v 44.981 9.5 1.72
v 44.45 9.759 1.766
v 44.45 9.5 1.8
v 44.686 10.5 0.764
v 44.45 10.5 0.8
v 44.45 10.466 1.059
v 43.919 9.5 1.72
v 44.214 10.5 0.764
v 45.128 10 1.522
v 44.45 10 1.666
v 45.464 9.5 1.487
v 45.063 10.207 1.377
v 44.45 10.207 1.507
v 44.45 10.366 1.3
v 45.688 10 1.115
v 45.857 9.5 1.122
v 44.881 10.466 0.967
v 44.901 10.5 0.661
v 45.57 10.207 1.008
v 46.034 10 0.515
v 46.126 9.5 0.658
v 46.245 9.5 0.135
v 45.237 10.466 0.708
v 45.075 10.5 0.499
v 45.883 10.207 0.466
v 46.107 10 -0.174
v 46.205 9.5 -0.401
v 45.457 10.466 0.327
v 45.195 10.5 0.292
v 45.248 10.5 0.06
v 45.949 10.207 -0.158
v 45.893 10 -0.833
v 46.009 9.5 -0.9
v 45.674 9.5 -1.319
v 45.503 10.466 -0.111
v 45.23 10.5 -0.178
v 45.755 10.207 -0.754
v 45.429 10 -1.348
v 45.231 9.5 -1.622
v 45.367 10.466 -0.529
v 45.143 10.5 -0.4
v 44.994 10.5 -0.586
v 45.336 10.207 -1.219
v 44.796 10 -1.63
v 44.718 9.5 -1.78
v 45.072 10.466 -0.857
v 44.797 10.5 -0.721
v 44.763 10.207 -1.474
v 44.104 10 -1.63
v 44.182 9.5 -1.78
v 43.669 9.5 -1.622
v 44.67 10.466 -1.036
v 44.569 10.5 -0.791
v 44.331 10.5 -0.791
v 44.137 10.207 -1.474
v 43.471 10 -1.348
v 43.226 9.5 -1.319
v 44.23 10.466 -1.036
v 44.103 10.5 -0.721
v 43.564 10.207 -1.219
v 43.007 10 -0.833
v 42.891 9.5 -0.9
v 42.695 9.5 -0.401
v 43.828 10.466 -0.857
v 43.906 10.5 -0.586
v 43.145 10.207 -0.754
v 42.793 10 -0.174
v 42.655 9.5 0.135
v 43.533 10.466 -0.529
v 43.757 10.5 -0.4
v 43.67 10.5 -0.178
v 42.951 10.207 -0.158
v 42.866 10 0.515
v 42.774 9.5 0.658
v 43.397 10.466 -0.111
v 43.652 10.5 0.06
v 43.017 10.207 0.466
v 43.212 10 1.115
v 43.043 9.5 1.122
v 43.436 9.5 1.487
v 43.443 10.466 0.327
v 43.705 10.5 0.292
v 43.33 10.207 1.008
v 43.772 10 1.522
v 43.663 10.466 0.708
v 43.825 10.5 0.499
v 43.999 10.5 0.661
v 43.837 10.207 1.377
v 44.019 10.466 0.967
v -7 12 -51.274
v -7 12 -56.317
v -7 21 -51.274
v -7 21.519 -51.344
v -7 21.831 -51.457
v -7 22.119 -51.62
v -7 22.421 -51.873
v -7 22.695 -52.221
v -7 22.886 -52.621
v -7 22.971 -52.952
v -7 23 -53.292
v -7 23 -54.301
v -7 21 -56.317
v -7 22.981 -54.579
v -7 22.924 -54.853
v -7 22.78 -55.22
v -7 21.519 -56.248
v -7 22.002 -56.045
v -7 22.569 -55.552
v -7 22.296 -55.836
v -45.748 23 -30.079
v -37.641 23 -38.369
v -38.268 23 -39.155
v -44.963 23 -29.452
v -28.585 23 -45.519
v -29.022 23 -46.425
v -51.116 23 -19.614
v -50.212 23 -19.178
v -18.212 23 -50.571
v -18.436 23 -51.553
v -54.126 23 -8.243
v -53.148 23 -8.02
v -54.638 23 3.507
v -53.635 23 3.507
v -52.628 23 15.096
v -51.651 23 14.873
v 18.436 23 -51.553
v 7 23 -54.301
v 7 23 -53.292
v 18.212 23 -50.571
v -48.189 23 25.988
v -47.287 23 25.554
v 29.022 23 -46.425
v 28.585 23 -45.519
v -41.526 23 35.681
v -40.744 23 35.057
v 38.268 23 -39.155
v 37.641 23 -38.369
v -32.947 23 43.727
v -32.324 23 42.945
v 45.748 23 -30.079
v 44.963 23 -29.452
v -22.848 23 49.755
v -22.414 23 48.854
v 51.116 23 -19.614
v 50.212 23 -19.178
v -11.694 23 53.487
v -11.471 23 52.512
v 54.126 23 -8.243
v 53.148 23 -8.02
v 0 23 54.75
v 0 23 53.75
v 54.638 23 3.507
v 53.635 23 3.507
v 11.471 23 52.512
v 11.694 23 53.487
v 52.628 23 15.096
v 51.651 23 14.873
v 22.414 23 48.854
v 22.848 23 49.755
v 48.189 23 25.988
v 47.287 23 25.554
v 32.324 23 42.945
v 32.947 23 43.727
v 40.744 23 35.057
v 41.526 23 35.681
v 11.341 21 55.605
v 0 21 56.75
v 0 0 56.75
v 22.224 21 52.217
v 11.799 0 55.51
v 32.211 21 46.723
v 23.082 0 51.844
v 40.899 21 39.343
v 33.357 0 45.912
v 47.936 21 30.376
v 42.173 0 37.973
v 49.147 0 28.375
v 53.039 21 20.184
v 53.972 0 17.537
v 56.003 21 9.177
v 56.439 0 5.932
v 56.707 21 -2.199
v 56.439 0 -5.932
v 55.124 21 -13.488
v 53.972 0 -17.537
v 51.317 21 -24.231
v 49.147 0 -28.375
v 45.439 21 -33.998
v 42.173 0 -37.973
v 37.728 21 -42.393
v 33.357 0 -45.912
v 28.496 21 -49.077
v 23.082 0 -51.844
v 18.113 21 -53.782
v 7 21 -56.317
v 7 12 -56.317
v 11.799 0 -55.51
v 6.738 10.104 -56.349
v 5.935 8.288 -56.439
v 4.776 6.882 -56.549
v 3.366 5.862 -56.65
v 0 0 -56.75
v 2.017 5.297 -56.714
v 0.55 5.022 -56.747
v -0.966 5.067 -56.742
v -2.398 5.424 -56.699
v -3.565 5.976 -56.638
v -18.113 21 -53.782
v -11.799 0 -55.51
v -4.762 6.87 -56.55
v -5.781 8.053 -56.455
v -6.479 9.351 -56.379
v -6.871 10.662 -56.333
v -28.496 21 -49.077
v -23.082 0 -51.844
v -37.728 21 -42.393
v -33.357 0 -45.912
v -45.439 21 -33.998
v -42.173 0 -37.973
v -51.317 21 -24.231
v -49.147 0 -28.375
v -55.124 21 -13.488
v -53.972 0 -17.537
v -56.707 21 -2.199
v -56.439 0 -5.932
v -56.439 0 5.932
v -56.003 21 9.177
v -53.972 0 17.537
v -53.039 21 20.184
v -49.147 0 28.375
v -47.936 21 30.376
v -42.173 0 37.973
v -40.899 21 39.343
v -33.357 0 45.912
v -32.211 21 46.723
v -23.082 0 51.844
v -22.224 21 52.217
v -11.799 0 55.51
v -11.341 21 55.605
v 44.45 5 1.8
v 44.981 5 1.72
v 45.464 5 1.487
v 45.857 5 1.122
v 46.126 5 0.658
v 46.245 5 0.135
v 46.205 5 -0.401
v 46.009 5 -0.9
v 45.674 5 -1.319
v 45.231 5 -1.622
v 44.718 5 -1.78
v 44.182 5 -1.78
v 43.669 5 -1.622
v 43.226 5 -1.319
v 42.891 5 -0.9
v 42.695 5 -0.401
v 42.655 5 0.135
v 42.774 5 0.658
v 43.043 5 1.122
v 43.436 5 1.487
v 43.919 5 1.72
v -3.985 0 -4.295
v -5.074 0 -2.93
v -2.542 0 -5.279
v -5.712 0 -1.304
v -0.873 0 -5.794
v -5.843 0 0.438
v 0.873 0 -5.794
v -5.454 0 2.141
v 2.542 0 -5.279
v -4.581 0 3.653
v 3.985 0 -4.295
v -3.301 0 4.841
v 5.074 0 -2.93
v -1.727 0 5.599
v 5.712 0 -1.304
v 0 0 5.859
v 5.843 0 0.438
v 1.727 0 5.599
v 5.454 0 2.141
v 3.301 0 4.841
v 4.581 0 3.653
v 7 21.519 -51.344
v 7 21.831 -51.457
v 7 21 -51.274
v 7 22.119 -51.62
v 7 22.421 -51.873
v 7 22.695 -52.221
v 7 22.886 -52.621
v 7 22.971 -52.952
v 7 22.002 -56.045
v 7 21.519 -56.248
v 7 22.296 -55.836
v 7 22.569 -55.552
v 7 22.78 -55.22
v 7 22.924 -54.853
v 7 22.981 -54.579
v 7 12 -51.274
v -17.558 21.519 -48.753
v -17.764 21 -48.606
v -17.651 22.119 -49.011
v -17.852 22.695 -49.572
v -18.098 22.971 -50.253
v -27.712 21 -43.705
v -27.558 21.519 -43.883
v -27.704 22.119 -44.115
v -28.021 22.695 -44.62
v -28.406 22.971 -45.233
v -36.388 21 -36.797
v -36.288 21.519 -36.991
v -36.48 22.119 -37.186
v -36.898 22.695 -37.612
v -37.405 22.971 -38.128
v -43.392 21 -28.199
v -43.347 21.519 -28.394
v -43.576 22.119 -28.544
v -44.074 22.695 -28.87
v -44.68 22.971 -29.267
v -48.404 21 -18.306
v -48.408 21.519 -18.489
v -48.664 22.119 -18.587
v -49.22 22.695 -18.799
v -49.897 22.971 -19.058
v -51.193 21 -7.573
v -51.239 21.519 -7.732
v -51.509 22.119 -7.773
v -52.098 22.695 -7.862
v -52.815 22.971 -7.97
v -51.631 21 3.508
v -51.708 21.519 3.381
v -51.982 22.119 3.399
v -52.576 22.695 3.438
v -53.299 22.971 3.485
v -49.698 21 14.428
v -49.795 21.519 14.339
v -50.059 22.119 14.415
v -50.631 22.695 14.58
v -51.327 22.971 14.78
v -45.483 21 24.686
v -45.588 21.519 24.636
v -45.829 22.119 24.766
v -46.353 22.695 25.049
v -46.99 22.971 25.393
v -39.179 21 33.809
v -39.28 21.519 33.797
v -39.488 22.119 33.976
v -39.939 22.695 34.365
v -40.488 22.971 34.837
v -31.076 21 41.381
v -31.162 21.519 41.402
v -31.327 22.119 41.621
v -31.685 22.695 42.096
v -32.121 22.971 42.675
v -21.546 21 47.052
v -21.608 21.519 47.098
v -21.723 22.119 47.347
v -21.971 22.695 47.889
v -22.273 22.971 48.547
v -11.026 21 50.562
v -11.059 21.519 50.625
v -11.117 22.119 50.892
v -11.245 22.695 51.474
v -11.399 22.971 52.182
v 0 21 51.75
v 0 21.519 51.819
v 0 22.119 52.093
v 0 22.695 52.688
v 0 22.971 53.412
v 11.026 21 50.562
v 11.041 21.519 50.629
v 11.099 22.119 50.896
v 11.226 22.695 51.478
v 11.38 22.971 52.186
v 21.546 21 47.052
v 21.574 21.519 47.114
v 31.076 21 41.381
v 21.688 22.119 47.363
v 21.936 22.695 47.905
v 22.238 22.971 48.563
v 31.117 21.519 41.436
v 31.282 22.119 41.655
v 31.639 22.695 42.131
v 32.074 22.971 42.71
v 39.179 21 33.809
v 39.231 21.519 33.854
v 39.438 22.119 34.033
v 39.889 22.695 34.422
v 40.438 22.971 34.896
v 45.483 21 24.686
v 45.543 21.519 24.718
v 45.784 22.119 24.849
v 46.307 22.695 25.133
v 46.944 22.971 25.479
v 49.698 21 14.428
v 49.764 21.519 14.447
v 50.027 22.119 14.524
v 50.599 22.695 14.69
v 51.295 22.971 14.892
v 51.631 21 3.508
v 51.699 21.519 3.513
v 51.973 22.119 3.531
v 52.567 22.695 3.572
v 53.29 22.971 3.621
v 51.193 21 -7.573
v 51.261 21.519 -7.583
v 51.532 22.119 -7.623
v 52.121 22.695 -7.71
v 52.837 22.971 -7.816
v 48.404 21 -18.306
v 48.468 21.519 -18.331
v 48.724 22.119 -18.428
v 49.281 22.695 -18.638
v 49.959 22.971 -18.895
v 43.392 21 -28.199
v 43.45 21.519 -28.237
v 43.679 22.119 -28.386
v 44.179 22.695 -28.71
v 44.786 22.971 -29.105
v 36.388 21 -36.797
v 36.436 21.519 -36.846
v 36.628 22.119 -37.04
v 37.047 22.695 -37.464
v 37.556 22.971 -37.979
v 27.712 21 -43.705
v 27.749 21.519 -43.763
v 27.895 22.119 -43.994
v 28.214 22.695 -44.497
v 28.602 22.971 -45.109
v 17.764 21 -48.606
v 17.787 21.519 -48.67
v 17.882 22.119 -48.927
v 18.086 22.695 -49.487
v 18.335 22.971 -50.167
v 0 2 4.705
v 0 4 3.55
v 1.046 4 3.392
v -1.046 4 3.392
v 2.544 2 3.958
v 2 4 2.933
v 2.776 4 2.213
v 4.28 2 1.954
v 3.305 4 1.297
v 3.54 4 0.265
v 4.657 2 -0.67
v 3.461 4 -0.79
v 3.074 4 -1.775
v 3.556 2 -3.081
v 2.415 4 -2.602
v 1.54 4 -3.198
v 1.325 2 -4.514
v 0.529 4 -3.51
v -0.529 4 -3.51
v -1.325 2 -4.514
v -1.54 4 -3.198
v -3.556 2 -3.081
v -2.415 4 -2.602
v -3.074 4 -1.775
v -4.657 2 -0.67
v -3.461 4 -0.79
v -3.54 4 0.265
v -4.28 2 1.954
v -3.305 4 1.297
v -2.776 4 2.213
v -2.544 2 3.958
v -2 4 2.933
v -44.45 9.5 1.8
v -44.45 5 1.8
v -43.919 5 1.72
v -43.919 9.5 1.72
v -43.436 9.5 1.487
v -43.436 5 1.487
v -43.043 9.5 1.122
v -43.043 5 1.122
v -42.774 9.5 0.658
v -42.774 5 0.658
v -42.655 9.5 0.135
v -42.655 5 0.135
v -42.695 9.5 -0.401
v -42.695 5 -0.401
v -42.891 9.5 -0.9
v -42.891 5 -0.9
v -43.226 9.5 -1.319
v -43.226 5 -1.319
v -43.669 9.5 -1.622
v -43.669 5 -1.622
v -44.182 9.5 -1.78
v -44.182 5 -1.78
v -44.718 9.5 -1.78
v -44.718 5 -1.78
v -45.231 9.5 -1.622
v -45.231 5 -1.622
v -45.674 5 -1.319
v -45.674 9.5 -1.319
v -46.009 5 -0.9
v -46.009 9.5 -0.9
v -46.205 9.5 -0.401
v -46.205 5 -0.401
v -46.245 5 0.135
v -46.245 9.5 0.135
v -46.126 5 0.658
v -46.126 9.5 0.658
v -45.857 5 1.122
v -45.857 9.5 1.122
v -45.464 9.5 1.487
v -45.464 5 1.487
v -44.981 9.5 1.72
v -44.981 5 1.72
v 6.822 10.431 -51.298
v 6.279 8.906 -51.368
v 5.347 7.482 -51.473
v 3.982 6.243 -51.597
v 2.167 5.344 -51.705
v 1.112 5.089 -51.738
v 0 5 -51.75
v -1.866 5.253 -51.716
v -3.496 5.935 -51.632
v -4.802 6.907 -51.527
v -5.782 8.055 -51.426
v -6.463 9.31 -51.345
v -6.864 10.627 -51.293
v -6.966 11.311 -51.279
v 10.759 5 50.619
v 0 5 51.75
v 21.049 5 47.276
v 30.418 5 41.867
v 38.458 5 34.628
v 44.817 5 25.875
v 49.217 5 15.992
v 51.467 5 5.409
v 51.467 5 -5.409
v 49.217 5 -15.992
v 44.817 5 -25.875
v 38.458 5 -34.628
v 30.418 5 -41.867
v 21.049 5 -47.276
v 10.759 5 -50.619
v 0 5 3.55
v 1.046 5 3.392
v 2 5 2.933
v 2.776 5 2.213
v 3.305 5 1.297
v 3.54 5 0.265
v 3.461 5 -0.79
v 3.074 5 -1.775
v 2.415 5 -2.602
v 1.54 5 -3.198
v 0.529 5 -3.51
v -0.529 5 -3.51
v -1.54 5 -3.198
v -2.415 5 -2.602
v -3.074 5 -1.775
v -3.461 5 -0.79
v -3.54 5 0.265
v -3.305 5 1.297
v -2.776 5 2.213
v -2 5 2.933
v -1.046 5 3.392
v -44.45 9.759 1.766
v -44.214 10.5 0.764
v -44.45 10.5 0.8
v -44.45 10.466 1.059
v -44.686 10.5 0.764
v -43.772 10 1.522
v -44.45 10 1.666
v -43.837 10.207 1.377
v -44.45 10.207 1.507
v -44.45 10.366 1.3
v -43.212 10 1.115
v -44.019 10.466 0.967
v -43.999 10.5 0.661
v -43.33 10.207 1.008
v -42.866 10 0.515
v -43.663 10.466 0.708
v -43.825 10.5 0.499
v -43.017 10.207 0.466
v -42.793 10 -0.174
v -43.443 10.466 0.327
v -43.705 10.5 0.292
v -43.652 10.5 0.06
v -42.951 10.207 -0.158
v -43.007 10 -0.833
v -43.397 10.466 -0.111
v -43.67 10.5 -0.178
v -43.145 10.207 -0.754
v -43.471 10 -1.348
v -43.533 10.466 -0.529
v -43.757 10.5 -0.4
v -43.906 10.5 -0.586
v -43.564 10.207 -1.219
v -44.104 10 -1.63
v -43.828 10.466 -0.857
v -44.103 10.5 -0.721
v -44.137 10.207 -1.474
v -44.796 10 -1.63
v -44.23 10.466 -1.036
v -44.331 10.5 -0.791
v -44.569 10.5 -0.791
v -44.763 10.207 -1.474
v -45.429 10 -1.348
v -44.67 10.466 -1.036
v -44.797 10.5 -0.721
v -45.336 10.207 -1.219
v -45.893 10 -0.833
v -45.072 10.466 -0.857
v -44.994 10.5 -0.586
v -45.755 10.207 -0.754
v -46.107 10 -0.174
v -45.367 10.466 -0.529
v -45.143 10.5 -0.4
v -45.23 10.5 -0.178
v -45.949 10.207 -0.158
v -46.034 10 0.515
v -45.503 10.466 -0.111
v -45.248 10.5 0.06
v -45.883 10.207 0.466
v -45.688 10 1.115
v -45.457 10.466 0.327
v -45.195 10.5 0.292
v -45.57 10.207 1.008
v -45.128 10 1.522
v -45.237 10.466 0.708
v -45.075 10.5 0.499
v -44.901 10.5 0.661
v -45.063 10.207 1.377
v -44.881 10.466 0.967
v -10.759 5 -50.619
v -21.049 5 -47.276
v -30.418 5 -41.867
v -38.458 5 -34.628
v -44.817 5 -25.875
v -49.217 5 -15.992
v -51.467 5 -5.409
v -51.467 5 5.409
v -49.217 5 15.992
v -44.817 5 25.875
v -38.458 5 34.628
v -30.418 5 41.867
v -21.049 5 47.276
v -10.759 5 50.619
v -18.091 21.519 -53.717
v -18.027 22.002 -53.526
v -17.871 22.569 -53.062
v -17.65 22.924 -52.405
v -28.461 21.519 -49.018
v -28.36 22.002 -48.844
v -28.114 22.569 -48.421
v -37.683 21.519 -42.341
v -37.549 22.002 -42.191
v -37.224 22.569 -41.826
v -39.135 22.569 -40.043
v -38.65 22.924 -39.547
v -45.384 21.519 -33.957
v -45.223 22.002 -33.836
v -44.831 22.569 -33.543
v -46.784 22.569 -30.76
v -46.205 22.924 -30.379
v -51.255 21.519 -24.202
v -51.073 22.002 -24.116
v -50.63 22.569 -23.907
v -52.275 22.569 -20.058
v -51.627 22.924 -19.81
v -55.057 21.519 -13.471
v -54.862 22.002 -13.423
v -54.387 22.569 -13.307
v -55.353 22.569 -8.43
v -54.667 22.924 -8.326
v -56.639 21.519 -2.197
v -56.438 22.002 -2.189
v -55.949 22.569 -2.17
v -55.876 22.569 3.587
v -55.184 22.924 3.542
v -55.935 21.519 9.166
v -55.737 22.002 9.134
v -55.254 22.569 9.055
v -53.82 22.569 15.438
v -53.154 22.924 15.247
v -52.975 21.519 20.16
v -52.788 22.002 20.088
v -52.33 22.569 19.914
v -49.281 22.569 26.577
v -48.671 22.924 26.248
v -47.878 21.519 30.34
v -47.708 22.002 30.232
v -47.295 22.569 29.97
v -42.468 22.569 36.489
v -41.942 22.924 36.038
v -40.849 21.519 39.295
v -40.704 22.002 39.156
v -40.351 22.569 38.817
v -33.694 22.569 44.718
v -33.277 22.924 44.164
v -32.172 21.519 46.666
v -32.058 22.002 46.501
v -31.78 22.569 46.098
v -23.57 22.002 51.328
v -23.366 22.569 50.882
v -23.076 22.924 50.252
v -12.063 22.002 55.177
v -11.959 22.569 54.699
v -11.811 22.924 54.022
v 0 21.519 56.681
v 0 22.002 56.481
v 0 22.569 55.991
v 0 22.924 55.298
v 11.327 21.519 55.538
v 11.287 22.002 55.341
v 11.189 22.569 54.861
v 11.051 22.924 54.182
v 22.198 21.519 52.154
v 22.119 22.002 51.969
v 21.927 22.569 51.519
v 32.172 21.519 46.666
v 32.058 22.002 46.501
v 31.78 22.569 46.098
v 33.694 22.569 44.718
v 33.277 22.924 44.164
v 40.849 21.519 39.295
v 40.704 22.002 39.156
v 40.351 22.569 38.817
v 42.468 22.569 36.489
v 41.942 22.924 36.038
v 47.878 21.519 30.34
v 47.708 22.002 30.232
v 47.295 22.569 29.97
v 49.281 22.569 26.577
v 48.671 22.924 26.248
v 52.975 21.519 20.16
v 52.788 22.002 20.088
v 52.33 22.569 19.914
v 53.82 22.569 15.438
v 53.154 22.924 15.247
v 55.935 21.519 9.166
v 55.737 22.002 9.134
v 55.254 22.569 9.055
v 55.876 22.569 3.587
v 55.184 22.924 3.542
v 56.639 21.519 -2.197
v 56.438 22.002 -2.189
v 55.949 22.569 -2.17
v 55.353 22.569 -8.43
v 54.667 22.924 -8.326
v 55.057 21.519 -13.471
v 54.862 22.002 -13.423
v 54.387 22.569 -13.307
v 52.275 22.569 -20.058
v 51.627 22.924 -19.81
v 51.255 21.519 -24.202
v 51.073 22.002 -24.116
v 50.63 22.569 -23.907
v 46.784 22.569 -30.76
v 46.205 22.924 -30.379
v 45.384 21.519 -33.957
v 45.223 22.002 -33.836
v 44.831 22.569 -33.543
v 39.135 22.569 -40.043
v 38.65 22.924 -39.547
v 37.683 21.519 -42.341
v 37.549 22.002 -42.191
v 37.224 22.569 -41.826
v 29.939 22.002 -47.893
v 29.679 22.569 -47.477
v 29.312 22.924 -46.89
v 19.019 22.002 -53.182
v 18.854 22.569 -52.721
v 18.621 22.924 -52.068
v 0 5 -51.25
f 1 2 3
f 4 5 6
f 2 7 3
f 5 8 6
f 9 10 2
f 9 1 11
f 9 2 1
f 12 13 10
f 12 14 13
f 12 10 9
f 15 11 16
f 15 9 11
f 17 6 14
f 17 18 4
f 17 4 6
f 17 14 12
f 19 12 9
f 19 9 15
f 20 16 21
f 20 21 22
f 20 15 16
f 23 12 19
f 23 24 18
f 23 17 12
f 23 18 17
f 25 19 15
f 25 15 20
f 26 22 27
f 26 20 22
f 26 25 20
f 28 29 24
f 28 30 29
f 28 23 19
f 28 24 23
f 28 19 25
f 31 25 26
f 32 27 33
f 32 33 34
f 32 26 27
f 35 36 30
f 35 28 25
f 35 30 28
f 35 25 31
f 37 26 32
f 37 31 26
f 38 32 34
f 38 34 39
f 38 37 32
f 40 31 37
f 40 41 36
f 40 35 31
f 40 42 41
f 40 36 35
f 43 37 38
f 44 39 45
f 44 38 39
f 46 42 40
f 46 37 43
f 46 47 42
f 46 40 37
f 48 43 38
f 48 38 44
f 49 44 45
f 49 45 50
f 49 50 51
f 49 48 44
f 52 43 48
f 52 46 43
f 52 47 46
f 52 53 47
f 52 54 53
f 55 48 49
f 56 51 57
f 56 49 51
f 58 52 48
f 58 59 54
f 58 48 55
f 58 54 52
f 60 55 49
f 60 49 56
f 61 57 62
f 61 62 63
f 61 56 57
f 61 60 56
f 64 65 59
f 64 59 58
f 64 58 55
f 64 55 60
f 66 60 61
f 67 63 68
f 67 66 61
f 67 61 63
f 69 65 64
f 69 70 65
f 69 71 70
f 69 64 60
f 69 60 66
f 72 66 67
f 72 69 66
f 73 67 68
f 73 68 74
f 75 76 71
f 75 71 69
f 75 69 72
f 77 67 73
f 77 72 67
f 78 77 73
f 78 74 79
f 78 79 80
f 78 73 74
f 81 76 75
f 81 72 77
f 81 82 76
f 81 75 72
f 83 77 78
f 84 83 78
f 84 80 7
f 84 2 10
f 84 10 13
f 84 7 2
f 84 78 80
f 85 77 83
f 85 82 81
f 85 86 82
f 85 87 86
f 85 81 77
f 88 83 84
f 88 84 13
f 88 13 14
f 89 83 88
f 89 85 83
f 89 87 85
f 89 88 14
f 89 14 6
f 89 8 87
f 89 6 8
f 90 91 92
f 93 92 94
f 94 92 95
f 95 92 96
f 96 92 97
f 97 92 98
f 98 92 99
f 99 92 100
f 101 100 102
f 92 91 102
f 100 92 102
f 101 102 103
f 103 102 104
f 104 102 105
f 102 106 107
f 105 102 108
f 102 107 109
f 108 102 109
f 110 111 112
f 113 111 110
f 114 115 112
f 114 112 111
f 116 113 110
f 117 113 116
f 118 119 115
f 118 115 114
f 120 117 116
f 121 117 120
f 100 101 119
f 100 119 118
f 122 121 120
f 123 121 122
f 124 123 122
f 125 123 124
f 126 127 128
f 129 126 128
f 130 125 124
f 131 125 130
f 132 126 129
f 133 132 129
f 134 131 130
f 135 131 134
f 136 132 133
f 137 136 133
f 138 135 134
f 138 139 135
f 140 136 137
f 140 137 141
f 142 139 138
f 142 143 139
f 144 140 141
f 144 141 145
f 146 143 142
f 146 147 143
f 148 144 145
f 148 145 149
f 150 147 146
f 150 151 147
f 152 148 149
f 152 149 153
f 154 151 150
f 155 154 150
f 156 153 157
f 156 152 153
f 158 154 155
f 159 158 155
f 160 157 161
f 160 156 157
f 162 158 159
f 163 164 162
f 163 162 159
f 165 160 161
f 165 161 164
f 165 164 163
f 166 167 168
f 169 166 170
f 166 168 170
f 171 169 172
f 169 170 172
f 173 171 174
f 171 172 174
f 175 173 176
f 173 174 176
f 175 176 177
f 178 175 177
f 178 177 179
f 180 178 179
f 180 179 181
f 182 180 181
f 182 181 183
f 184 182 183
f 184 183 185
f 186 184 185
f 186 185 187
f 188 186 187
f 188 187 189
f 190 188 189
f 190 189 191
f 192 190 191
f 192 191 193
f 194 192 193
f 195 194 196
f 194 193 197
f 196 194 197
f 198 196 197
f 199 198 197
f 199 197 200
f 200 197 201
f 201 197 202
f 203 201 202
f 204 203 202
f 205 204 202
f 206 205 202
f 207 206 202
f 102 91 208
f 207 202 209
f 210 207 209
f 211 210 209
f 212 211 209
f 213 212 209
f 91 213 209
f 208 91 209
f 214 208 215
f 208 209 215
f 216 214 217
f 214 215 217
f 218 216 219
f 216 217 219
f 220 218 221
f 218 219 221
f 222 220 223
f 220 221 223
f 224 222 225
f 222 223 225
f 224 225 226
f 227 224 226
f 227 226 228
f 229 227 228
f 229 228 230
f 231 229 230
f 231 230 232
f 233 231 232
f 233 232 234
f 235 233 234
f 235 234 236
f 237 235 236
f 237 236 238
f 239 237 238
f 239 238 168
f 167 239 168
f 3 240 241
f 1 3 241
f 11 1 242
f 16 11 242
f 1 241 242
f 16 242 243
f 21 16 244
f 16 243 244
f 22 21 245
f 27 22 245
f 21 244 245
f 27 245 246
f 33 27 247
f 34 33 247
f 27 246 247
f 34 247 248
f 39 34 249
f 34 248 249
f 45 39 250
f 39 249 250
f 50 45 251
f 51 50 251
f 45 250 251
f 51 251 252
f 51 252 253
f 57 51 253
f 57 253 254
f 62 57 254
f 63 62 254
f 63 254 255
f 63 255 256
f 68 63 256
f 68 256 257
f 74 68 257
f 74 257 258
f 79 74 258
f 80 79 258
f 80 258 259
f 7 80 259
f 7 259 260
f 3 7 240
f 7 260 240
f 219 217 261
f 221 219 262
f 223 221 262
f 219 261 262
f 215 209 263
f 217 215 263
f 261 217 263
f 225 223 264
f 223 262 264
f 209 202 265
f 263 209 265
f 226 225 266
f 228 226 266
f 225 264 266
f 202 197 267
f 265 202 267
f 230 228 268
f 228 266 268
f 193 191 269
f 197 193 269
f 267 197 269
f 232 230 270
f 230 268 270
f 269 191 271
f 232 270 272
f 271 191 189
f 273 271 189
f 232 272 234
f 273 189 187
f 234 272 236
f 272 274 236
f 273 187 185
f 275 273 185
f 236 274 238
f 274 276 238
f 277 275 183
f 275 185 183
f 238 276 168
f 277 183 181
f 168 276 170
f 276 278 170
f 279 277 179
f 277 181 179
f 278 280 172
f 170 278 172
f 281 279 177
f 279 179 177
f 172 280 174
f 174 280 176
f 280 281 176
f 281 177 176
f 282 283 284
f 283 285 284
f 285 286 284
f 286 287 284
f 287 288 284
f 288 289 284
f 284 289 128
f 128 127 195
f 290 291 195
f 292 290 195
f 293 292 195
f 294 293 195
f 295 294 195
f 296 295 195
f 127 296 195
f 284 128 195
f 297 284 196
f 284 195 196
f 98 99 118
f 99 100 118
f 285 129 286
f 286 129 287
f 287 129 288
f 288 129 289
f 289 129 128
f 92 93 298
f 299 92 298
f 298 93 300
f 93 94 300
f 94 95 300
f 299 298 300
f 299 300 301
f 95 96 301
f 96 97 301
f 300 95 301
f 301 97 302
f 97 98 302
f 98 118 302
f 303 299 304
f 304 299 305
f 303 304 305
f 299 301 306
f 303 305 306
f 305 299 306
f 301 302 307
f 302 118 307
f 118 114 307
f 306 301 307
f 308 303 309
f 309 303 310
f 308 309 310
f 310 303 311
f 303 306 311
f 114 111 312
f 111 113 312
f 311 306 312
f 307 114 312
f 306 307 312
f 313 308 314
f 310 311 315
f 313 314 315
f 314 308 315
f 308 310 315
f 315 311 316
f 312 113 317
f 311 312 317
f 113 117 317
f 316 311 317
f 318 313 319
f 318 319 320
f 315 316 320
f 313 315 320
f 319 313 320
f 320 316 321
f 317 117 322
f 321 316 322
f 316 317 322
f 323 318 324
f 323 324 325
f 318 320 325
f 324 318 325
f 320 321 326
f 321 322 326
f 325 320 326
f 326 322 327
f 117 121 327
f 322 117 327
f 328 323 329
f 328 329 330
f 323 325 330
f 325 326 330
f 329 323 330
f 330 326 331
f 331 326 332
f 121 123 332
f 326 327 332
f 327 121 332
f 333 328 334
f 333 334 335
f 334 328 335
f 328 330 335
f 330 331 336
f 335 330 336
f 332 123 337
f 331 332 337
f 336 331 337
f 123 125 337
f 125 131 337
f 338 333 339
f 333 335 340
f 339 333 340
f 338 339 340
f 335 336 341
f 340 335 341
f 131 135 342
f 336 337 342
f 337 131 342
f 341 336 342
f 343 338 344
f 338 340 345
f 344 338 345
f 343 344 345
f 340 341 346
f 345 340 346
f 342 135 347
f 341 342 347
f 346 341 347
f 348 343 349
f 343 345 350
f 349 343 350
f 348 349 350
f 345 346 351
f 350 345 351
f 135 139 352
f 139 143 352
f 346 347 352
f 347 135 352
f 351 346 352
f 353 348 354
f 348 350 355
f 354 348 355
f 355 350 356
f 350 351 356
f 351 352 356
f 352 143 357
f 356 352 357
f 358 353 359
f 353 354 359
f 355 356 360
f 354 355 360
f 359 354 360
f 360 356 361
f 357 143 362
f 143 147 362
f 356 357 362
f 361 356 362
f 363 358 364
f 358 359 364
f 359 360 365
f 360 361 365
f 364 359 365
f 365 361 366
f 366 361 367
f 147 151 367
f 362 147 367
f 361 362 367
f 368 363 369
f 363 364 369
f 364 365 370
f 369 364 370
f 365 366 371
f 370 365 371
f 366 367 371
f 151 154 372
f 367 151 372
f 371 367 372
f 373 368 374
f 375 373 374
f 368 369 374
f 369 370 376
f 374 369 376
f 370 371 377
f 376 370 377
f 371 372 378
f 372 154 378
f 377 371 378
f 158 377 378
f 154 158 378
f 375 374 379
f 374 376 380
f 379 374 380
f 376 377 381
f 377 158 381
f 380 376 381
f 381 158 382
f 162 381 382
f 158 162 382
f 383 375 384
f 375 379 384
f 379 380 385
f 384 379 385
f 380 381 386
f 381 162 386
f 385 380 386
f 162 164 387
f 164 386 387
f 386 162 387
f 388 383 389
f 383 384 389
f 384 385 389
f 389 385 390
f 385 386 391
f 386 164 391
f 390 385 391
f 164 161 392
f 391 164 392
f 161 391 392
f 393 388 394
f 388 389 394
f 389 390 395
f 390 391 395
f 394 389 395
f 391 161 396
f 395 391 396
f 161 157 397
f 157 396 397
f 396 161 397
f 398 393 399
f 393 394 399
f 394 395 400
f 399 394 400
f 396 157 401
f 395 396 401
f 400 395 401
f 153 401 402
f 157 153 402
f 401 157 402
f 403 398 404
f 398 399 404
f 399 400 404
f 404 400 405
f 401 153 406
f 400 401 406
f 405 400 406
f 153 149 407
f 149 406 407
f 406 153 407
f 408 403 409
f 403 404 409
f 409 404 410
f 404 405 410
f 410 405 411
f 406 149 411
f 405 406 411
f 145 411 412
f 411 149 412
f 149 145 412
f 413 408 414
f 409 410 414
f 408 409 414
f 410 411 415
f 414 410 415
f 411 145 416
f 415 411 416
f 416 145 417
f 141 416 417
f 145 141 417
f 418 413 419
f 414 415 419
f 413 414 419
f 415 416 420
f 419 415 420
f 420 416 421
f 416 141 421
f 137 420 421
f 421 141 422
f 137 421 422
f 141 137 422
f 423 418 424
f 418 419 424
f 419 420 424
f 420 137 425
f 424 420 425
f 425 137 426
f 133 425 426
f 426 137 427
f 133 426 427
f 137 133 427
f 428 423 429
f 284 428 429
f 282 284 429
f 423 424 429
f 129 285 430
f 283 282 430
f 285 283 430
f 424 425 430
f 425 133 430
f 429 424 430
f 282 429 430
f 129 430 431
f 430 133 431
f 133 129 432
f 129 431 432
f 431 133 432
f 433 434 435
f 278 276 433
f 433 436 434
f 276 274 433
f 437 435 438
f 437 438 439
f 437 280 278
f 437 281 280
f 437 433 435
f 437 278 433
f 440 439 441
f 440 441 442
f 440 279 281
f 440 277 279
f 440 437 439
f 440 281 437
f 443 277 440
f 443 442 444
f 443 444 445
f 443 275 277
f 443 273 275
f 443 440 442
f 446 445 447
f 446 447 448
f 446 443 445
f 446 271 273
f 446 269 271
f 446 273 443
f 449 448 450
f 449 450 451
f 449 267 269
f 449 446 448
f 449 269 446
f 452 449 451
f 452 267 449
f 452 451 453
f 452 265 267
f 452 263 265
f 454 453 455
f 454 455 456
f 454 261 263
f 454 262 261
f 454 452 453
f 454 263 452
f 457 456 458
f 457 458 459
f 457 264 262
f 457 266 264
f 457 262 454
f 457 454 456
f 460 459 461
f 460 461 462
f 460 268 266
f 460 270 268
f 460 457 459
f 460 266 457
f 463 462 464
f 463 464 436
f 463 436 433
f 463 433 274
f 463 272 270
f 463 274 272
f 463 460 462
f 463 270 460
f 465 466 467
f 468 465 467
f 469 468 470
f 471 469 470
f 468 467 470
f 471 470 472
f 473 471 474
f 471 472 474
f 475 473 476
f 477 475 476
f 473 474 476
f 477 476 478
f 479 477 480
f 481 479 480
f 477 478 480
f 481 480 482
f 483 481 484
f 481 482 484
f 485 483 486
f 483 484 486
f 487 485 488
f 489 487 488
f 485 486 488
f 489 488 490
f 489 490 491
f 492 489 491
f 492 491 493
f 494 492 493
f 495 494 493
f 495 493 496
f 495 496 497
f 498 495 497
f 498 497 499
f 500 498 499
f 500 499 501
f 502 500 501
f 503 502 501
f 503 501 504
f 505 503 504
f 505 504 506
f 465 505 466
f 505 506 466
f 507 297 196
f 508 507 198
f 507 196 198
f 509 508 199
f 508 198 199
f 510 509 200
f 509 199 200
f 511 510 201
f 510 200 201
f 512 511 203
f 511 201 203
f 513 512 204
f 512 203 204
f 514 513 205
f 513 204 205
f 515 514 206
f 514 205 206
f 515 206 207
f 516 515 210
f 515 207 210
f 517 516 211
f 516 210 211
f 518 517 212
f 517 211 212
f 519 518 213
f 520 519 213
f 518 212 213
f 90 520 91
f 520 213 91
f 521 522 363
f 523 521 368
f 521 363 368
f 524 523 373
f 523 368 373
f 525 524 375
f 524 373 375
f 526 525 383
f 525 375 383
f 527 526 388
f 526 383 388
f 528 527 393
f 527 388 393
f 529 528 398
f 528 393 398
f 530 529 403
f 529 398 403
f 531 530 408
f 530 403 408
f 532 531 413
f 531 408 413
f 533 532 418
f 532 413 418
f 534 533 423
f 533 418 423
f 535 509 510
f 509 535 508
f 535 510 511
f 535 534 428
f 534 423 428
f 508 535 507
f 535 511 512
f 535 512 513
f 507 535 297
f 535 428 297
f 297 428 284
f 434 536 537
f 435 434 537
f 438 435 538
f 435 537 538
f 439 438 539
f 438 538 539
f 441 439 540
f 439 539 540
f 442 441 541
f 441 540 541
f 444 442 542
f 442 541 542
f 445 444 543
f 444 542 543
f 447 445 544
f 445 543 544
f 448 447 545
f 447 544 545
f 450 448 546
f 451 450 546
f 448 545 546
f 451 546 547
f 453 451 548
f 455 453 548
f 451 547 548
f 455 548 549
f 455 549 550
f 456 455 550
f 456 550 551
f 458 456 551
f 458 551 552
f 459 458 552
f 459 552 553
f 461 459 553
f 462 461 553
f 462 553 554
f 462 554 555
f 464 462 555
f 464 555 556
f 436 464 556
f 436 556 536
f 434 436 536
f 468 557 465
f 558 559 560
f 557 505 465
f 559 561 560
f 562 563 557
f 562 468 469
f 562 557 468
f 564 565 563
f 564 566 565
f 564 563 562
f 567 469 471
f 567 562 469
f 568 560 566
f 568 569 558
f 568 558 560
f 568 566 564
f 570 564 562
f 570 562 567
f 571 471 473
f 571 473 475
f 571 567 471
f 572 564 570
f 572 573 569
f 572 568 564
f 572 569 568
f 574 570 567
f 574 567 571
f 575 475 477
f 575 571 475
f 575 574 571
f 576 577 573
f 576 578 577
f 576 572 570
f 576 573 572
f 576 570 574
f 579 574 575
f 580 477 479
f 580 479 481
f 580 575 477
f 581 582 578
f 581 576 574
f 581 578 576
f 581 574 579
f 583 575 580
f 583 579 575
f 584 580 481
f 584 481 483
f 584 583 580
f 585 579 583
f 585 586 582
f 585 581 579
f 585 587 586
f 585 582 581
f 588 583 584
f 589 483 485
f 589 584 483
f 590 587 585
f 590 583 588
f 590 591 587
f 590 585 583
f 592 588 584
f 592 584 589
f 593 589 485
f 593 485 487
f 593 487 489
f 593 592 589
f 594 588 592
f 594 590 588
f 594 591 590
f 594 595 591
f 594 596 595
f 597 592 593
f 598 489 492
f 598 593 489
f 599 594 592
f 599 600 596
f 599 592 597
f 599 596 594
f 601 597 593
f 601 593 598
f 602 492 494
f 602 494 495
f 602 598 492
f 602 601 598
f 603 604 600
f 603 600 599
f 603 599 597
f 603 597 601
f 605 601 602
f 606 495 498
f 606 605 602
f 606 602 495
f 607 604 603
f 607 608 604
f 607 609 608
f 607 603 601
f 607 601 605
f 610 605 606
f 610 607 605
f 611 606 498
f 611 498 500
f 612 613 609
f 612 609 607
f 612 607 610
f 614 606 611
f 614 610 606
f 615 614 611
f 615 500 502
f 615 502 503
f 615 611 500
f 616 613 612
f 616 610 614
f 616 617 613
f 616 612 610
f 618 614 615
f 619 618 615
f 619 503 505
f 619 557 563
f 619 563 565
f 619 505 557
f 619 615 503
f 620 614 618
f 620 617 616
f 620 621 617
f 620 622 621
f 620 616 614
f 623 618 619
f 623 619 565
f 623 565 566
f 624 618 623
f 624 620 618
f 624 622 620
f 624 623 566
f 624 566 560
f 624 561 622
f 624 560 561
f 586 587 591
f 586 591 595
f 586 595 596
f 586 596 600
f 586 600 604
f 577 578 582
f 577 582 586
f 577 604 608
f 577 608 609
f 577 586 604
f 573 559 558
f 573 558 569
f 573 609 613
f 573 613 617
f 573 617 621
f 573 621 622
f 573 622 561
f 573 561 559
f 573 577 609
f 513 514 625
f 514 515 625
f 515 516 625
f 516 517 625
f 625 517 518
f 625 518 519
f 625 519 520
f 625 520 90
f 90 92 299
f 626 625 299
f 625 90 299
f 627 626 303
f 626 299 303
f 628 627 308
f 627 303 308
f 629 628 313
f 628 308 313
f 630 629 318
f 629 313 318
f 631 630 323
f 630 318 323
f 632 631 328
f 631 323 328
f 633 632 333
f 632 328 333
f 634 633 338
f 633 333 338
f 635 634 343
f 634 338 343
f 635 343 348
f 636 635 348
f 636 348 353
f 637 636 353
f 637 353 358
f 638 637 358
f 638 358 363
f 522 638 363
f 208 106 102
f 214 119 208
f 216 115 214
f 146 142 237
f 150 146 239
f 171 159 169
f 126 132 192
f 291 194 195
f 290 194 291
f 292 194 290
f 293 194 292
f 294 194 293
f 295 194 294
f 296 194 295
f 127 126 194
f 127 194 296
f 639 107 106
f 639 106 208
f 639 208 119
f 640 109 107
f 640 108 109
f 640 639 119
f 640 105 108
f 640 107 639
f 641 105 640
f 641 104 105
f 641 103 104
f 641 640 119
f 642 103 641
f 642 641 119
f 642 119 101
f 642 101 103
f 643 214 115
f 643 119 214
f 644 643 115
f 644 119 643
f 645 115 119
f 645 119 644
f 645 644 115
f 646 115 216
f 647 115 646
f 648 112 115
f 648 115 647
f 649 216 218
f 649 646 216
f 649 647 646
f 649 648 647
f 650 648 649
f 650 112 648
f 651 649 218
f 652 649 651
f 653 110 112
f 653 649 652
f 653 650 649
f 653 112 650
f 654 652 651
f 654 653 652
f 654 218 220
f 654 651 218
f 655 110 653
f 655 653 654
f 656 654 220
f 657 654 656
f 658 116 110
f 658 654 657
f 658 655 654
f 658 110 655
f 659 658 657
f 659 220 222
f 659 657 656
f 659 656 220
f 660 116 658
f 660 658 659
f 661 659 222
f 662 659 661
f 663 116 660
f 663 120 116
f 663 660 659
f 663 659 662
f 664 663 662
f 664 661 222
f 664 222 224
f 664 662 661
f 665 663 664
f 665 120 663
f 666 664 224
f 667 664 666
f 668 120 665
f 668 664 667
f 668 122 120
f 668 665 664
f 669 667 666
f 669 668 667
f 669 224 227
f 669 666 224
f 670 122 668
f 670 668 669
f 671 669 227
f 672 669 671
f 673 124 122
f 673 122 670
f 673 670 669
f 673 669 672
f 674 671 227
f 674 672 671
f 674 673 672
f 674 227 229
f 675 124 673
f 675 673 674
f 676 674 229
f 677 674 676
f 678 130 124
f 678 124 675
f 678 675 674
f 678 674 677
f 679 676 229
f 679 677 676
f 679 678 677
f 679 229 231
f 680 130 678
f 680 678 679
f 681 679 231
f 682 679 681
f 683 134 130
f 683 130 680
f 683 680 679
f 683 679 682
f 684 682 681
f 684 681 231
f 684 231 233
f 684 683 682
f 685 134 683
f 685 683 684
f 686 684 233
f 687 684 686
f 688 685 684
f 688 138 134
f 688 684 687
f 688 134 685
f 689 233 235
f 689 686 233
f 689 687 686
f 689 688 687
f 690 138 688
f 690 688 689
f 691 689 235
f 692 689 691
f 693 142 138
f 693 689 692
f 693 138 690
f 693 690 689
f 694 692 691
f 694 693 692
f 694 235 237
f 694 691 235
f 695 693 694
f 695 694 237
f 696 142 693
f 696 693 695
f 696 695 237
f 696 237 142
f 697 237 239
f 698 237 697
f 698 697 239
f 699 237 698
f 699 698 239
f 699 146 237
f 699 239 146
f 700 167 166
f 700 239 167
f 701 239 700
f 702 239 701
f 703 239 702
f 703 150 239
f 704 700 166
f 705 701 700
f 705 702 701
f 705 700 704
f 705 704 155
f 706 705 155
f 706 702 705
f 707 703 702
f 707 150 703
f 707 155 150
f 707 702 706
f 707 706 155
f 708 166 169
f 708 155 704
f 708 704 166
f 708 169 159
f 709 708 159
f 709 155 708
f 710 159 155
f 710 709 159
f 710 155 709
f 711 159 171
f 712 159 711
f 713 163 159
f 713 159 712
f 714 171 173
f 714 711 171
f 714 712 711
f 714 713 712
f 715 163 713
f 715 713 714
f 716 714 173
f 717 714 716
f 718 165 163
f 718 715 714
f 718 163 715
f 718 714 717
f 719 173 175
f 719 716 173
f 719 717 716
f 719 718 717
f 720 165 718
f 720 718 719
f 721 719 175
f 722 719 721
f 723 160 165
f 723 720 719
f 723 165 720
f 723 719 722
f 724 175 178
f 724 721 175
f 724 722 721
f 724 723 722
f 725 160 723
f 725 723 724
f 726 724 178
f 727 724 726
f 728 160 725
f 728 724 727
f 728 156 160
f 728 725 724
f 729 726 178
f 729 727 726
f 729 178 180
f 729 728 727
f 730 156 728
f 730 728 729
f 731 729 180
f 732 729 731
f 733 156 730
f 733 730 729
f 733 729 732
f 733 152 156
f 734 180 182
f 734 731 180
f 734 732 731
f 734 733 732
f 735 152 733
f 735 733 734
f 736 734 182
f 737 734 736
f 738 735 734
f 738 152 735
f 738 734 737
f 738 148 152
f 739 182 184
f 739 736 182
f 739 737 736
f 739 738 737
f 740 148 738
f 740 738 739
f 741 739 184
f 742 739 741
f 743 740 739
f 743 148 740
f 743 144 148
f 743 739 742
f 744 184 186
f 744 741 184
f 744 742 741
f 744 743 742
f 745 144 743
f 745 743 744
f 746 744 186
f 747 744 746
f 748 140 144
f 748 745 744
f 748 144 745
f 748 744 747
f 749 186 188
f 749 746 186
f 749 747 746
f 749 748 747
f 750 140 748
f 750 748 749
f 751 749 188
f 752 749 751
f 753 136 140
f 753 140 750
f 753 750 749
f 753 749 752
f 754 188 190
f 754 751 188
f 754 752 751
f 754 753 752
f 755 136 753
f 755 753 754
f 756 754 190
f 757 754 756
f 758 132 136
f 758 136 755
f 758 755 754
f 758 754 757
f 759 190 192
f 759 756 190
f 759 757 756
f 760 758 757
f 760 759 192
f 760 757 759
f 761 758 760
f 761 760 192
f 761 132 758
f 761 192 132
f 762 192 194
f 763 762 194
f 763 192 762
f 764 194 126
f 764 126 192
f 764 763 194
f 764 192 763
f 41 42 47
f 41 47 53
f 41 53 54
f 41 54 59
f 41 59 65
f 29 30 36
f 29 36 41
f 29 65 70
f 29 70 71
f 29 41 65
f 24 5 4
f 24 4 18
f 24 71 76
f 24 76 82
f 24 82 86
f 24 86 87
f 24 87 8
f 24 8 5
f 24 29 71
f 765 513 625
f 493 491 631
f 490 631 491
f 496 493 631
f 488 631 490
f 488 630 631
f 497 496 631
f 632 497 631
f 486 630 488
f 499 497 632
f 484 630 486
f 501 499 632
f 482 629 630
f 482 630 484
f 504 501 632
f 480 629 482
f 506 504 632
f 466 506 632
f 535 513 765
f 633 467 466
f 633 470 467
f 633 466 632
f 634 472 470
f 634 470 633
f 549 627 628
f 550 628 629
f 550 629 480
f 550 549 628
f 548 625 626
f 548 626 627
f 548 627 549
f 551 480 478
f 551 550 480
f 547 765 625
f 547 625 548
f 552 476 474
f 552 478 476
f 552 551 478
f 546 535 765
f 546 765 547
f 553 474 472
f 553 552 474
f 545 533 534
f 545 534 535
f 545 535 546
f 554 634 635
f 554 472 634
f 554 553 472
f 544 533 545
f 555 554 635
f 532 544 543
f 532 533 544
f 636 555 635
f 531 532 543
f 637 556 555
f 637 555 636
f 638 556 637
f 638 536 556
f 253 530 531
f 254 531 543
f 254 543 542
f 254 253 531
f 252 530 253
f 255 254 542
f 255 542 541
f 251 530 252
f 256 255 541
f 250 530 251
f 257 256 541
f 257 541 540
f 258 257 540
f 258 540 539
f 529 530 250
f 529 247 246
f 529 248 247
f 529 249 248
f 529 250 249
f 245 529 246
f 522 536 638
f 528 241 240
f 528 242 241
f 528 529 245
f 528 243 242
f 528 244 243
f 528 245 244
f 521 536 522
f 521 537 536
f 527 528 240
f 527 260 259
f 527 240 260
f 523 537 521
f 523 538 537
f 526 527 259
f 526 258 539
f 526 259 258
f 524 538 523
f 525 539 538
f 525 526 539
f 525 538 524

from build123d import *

# Parameters (mm, degrees)
SKETCH1_R               = 56.75
BOSS_EXTRUDE3_DEPTH     = 23
SKETCH10_R              = 51.75
CUT_EXTRUDE3_DEPTH      = 18
SKETCH12_R              = 3.55
CUT_EXTRUDE4_DEPTH      = 83.250379938
SKETCH17_R              = 1.8
BOSS_EXTRUDE4_DEPTH     = 5.5
SKETCH18_R              = 1.8
BOSS_EXTRUDE5_DEPTH     = 5.5
FILLET5_R               = 1
FILLET6_R               = 1
CUT_EXTRUDE5_DEPTH      = 3
CUT_EXTRUDE5_DEPTH_BACK = 3
FILLET7_R               = 2
FILLET8_R               = 2
CHAMFER1_SIZE           = 4
CHAMFER1_SIZE2          = 2.309401077


with BuildPart() as part:
    # Sketch1 → Boss-Extrude3 (new body)
    with BuildSketch(Plane(origin=(0, 0, 0), x_dir=(1, 0, 0), z_dir=(0, 1, 0))):
        Circle(SKETCH1_R)
    extrude(amount=BOSS_EXTRUDE3_DEPTH)

    # Sketch10 → Cut-Extrude3 (cut)
    with BuildSketch(Plane(origin=(0, 23, 0), x_dir=(1, 0, 0), z_dir=(0, 1, 0))):
        Circle(SKETCH10_R)
    extrude(amount=-CUT_EXTRUDE3_DEPTH, mode=Mode.SUBTRACT)

    # Sketch12 → Cut-Extrude4 (cut, through all)
    with BuildSketch(Plane(origin=(0, 5, 0), x_dir=(1, 0, 0), z_dir=(0, 1, 0))):
        Circle(SKETCH12_R)
    extrude(amount=-CUT_EXTRUDE4_DEPTH, mode=Mode.SUBTRACT)

    # Sketch17 → Boss-Extrude4 (add)
    with BuildSketch(Plane(origin=(0, 5, 0), x_dir=(1, 0, 0), z_dir=(0, 1, 0))):
        with Locations((-44.45, 0)):
            Circle(SKETCH17_R)
    extrude(amount=BOSS_EXTRUDE4_DEPTH)

    # Sketch18 → Boss-Extrude5 (add)
    with BuildSketch(Plane(origin=(0, 5, 0), x_dir=(1, 0, 0), z_dir=(0, 1, 0))):
        with Locations((44.45, 0)):
            Circle(SKETCH18_R)
    extrude(amount=BOSS_EXTRUDE5_DEPTH)

    # Fillet5
    fillet5_edges = [part.edges().sort_by_distance(p)[0] for p in [
        (-46.25, 10.5, 0),
    ]]
    fillet(fillet5_edges, radius=FILLET5_R)

    # Fillet6
    fillet6_edges = [part.edges().sort_by_distance(p)[0] for p in [
        (42.65, 10.5, 0),
    ]]
    fillet(fillet6_edges, radius=FILLET6_R)

    # Sketch27 → Cut-Extrude5 (cut, two sides: drawn at the far end of the back side and taken through both)
    with BuildSketch(Plane.XY.offset(-54.25).offset(-CUT_EXTRUDE5_DEPTH_BACK)):
        with BuildLine():
            Line((7, 23), (7, 12))
            ThreePointArc((7, 12), (0, 5), (-7, 12))
            Line((-7, 12), (-7, 23))
            ThreePointArc((-7, 23), (0, 30), (7, 23))
        make_face()
    extrude(amount=CUT_EXTRUDE5_DEPTH + CUT_EXTRUDE5_DEPTH_BACK, mode=Mode.SUBTRACT)

    # Fillet7
    fillet7_edges = [part.edges().sort_by_distance(p)[0] for p in [
        (-34.028021541, 23, 38.989181192),
    ]]
    fillet(fillet7_edges, radius=FILLET7_R)

    # Fillet8
    fillet8_edges = [part.edges().sort_by_distance(p)[0] for p in [
        (-37.572014186, 23, 42.531238519),
    ]]
    fillet(fillet8_edges, radius=FILLET8_R)

    # Chamfer1
    chamfer1_edges = [part.edges().sort_by_distance(p)[0] for p in [
        (-3.55, 0, 0),
    ]]
    chamfer1_side = [part.faces().sort_by_distance(p)[0] for p in [
        (-3.55, 2.5, 0),
    ]]
    chamfer(chamfer1_edges, length=CHAMFER1_SIZE, length2=CHAMFER1_SIZE2, reference=chamfer1_side[0])


solid = part.part
